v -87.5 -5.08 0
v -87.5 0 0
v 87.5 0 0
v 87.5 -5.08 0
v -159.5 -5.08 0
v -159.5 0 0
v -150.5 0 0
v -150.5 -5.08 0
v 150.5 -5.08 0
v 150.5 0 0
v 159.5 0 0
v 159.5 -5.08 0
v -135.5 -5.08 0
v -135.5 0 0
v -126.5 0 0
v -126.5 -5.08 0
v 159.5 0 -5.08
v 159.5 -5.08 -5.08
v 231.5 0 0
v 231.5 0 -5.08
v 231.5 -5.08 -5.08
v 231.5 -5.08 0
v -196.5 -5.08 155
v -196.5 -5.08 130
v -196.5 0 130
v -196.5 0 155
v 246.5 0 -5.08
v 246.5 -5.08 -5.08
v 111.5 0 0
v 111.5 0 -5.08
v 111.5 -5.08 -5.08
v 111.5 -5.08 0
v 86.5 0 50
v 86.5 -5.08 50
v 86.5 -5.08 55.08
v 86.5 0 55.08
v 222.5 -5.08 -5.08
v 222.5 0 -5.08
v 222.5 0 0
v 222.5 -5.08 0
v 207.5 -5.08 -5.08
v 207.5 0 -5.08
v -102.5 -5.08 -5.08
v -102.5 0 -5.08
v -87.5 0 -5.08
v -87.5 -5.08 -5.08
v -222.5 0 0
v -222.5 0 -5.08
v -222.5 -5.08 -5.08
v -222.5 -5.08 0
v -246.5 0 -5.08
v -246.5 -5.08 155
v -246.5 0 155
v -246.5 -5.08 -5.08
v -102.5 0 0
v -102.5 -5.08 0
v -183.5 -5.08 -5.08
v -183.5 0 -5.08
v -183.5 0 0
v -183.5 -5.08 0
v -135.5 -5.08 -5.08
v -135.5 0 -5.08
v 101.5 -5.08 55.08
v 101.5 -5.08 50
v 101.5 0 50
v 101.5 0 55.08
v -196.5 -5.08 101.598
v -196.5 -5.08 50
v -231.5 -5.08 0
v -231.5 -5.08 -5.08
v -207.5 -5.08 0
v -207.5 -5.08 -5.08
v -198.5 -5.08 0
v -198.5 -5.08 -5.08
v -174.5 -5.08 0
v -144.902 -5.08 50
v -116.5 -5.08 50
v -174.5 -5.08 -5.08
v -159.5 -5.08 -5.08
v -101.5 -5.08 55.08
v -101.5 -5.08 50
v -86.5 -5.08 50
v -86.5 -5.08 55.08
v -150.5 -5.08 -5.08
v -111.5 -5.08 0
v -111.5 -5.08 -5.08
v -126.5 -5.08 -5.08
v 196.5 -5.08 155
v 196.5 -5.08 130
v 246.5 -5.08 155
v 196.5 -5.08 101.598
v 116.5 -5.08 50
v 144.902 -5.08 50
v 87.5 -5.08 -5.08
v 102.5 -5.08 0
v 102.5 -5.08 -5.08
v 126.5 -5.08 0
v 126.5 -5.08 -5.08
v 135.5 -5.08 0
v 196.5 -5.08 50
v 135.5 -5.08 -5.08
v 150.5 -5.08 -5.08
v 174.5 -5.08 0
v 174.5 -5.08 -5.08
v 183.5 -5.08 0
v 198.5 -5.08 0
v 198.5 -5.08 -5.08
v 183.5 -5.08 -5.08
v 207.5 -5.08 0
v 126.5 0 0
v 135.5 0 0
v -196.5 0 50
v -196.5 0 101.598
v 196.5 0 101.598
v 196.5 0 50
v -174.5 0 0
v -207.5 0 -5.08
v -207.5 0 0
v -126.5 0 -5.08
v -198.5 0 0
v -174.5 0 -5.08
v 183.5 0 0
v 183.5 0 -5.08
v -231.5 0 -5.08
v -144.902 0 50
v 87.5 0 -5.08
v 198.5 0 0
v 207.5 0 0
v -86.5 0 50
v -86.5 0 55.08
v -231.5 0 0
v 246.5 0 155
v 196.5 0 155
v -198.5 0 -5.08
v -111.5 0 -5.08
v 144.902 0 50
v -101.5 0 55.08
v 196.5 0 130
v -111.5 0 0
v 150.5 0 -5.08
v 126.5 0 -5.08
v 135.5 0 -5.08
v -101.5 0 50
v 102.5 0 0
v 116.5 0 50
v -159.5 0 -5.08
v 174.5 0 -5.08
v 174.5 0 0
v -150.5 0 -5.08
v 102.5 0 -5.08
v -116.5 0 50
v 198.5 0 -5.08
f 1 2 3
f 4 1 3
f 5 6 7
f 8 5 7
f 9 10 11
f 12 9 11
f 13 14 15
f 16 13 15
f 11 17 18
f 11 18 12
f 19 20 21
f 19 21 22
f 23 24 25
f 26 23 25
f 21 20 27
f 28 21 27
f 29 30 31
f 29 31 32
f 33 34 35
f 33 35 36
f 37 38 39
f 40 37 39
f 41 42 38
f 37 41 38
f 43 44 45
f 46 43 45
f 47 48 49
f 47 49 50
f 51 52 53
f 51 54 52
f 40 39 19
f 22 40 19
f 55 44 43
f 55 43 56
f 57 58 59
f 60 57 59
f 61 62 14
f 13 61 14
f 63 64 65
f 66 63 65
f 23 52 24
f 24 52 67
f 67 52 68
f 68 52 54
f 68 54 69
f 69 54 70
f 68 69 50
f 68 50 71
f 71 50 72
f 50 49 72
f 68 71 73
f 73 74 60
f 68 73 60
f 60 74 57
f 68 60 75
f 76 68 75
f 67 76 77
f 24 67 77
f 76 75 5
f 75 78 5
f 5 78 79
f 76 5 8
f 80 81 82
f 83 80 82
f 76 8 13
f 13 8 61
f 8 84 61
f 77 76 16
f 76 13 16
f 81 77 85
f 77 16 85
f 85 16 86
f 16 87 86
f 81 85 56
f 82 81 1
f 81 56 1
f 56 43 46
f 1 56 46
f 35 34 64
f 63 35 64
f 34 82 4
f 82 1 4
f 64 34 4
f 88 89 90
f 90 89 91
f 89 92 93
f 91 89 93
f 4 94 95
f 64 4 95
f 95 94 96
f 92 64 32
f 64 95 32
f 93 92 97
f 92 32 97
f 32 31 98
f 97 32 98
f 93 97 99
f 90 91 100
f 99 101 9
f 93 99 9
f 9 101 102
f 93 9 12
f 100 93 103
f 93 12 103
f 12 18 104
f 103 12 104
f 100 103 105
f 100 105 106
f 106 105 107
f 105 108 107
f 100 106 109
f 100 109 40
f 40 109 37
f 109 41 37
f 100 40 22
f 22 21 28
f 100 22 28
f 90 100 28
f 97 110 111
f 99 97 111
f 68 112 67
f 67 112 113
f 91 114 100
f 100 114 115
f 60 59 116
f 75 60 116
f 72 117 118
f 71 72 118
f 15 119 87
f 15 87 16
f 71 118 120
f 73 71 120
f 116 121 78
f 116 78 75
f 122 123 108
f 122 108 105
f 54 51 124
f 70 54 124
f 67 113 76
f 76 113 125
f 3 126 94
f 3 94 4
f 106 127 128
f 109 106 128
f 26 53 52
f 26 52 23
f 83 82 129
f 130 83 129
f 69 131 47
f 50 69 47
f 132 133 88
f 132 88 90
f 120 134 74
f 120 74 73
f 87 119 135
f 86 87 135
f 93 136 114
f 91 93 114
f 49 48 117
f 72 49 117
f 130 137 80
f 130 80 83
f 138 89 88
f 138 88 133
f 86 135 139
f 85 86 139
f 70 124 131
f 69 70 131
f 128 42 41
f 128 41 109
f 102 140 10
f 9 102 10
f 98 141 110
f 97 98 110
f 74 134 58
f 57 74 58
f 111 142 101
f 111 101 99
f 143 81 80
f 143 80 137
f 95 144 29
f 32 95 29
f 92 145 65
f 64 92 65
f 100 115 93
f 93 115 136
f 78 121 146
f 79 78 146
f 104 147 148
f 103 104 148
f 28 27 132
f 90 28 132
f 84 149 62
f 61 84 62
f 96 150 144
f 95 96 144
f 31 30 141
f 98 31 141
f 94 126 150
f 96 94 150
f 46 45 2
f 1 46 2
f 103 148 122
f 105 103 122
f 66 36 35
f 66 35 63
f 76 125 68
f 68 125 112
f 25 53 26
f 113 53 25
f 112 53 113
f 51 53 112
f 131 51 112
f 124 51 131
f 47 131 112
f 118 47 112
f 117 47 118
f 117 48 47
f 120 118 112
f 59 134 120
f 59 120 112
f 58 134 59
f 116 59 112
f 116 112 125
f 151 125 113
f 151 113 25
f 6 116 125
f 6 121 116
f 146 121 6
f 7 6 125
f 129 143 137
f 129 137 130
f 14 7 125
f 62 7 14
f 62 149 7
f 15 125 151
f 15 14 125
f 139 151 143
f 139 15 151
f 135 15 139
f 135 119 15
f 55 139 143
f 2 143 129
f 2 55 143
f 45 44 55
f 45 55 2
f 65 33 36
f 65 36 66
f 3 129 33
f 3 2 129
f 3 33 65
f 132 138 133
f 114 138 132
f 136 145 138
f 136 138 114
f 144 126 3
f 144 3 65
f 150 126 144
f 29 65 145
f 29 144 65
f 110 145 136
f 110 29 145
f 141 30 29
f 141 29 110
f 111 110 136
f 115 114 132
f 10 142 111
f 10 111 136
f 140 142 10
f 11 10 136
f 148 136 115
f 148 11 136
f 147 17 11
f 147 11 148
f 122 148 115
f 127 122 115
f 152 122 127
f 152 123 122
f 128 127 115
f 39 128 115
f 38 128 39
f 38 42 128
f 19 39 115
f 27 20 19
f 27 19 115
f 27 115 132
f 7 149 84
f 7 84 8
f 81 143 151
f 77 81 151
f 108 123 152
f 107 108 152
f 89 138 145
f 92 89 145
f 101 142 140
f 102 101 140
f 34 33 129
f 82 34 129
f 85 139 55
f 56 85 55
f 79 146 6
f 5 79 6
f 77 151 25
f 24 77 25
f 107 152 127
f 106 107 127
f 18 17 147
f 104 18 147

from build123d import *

# Parameters (mm, degrees)
F0_W      = 15
F0_H      = 5.08
F1_DEPTH  = 5.08
F1_FACE_W = 50
F1_FACE_H = 5.08
F2_DEPTH  = 25
F3_W      = 15
F3_H      = 5.08
F4_DEPTH  = 5.08
F5_W      = 15
F5_H      = 5.08
F6_DEPTH  = 5.08


with BuildPart() as f1:
    # F0 (on Front) → F1 (new body)
    with BuildSketch(Plane.XZ):
        Polygon((-87.5, 0), (0, 0), (0, 50), (-116.5, 50), (-144.902377, 50), (-196.5, 50), (-196.5, 101.597623), (-196.5, 130), (-246.5, 130), (-246.5, 0), (-231.5, 0), (-222.5, 0), (-207.5, 0), (-198.5, 0), (-183.5, 0), (-174.5, 0), (-159.5, 0), (-150.5, 0), (-135.5, 0), (-126.5, 0), (-111.5, 0), (-102.5, 0), align=None)
        Polygon((0, 50), (0, 0), (87.5, 0), (102.5, 0), (111.5, 0), (126.5, 0), (135.5, 0), (150.5, 0), (159.5, 0), (174.5, 0), (183.5, 0), (198.5, 0), (207.5, 0), (222.5, 0), (231.5, 0), (246.5, 0), (246.5, 130), (196.5, 130), (196.5, 101.597623), (196.5, 50), (144.902377, 50), (116.5, 50), align=None)
        with Locations((-95, -2.54)):
            Rectangle(F0_W, F0_H)
        with Locations((95, -2.54)):
            Rectangle(F0_W, F0_H)
        Polygon((-144.902377, 50), (-116.5, 50), (-196.5, 130), (-196.5, 101.597623), align=None)
        Polygon((196.5, 130), (116.5, 50), (144.902377, 50), (196.5, 101.597623), align=None)
        with Locations((-119, -2.54)):
            Rectangle(F0_W, F0_H)
        with Locations((119, -2.54)):
            Rectangle(F0_W, F0_H)
        with Locations((-143, -2.54)):
            Rectangle(F0_W, F0_H)
        with Locations((-239, -2.54)):
            Rectangle(F0_W, F0_H)
        with Locations((239, -2.54)):
            Rectangle(F0_W, F0_H)
        with Locations((143, -2.54)):
            Rectangle(F0_W, F0_H)
        with Locations((-167, -2.54)):
            Rectangle(F0_W, F0_H)
        with Locations((-215, -2.54)):
            Rectangle(F0_W, F0_H)
        with Locations((215, -2.54)):
            Rectangle(F0_W, F0_H)
        with Locations((167, -2.54)):
            Rectangle(F0_W, F0_H)
        with Locations((-191, -2.54)):
            Rectangle(F0_W, F0_H)
        with Locations((191, -2.54)):
            Rectangle(F0_W, F0_H)
    extrude(amount=F1_DEPTH)

    # F1_face (on face) → F2 (join)
    with BuildSketch(Plane(origin=(-221.5, -2.54, 130), x_dir=(1, 0, 0), z_dir=(0, 0, 1))):
        Rectangle(F1_FACE_W, F1_FACE_H)
        with Locations((443, 0)):
            Rectangle(F1_FACE_W, F1_FACE_H)
    extrude(amount=F2_DEPTH)

    # F3 (on face) → F4 (join)
    with BuildSketch(Plane.XY.offset(50)):
        with Locations((94, -2.54)):
            Rectangle(F3_W, F3_H)
    extrude(amount=F4_DEPTH)

    # F5 (on face) → F6 (join)
    with BuildSketch(Plane.XY.offset(50)):
        with Locations((-94, -2.54)):
            Rectangle(F5_W, F5_H)
    extrude(amount=F6_DEPTH)


solid = f1.part
